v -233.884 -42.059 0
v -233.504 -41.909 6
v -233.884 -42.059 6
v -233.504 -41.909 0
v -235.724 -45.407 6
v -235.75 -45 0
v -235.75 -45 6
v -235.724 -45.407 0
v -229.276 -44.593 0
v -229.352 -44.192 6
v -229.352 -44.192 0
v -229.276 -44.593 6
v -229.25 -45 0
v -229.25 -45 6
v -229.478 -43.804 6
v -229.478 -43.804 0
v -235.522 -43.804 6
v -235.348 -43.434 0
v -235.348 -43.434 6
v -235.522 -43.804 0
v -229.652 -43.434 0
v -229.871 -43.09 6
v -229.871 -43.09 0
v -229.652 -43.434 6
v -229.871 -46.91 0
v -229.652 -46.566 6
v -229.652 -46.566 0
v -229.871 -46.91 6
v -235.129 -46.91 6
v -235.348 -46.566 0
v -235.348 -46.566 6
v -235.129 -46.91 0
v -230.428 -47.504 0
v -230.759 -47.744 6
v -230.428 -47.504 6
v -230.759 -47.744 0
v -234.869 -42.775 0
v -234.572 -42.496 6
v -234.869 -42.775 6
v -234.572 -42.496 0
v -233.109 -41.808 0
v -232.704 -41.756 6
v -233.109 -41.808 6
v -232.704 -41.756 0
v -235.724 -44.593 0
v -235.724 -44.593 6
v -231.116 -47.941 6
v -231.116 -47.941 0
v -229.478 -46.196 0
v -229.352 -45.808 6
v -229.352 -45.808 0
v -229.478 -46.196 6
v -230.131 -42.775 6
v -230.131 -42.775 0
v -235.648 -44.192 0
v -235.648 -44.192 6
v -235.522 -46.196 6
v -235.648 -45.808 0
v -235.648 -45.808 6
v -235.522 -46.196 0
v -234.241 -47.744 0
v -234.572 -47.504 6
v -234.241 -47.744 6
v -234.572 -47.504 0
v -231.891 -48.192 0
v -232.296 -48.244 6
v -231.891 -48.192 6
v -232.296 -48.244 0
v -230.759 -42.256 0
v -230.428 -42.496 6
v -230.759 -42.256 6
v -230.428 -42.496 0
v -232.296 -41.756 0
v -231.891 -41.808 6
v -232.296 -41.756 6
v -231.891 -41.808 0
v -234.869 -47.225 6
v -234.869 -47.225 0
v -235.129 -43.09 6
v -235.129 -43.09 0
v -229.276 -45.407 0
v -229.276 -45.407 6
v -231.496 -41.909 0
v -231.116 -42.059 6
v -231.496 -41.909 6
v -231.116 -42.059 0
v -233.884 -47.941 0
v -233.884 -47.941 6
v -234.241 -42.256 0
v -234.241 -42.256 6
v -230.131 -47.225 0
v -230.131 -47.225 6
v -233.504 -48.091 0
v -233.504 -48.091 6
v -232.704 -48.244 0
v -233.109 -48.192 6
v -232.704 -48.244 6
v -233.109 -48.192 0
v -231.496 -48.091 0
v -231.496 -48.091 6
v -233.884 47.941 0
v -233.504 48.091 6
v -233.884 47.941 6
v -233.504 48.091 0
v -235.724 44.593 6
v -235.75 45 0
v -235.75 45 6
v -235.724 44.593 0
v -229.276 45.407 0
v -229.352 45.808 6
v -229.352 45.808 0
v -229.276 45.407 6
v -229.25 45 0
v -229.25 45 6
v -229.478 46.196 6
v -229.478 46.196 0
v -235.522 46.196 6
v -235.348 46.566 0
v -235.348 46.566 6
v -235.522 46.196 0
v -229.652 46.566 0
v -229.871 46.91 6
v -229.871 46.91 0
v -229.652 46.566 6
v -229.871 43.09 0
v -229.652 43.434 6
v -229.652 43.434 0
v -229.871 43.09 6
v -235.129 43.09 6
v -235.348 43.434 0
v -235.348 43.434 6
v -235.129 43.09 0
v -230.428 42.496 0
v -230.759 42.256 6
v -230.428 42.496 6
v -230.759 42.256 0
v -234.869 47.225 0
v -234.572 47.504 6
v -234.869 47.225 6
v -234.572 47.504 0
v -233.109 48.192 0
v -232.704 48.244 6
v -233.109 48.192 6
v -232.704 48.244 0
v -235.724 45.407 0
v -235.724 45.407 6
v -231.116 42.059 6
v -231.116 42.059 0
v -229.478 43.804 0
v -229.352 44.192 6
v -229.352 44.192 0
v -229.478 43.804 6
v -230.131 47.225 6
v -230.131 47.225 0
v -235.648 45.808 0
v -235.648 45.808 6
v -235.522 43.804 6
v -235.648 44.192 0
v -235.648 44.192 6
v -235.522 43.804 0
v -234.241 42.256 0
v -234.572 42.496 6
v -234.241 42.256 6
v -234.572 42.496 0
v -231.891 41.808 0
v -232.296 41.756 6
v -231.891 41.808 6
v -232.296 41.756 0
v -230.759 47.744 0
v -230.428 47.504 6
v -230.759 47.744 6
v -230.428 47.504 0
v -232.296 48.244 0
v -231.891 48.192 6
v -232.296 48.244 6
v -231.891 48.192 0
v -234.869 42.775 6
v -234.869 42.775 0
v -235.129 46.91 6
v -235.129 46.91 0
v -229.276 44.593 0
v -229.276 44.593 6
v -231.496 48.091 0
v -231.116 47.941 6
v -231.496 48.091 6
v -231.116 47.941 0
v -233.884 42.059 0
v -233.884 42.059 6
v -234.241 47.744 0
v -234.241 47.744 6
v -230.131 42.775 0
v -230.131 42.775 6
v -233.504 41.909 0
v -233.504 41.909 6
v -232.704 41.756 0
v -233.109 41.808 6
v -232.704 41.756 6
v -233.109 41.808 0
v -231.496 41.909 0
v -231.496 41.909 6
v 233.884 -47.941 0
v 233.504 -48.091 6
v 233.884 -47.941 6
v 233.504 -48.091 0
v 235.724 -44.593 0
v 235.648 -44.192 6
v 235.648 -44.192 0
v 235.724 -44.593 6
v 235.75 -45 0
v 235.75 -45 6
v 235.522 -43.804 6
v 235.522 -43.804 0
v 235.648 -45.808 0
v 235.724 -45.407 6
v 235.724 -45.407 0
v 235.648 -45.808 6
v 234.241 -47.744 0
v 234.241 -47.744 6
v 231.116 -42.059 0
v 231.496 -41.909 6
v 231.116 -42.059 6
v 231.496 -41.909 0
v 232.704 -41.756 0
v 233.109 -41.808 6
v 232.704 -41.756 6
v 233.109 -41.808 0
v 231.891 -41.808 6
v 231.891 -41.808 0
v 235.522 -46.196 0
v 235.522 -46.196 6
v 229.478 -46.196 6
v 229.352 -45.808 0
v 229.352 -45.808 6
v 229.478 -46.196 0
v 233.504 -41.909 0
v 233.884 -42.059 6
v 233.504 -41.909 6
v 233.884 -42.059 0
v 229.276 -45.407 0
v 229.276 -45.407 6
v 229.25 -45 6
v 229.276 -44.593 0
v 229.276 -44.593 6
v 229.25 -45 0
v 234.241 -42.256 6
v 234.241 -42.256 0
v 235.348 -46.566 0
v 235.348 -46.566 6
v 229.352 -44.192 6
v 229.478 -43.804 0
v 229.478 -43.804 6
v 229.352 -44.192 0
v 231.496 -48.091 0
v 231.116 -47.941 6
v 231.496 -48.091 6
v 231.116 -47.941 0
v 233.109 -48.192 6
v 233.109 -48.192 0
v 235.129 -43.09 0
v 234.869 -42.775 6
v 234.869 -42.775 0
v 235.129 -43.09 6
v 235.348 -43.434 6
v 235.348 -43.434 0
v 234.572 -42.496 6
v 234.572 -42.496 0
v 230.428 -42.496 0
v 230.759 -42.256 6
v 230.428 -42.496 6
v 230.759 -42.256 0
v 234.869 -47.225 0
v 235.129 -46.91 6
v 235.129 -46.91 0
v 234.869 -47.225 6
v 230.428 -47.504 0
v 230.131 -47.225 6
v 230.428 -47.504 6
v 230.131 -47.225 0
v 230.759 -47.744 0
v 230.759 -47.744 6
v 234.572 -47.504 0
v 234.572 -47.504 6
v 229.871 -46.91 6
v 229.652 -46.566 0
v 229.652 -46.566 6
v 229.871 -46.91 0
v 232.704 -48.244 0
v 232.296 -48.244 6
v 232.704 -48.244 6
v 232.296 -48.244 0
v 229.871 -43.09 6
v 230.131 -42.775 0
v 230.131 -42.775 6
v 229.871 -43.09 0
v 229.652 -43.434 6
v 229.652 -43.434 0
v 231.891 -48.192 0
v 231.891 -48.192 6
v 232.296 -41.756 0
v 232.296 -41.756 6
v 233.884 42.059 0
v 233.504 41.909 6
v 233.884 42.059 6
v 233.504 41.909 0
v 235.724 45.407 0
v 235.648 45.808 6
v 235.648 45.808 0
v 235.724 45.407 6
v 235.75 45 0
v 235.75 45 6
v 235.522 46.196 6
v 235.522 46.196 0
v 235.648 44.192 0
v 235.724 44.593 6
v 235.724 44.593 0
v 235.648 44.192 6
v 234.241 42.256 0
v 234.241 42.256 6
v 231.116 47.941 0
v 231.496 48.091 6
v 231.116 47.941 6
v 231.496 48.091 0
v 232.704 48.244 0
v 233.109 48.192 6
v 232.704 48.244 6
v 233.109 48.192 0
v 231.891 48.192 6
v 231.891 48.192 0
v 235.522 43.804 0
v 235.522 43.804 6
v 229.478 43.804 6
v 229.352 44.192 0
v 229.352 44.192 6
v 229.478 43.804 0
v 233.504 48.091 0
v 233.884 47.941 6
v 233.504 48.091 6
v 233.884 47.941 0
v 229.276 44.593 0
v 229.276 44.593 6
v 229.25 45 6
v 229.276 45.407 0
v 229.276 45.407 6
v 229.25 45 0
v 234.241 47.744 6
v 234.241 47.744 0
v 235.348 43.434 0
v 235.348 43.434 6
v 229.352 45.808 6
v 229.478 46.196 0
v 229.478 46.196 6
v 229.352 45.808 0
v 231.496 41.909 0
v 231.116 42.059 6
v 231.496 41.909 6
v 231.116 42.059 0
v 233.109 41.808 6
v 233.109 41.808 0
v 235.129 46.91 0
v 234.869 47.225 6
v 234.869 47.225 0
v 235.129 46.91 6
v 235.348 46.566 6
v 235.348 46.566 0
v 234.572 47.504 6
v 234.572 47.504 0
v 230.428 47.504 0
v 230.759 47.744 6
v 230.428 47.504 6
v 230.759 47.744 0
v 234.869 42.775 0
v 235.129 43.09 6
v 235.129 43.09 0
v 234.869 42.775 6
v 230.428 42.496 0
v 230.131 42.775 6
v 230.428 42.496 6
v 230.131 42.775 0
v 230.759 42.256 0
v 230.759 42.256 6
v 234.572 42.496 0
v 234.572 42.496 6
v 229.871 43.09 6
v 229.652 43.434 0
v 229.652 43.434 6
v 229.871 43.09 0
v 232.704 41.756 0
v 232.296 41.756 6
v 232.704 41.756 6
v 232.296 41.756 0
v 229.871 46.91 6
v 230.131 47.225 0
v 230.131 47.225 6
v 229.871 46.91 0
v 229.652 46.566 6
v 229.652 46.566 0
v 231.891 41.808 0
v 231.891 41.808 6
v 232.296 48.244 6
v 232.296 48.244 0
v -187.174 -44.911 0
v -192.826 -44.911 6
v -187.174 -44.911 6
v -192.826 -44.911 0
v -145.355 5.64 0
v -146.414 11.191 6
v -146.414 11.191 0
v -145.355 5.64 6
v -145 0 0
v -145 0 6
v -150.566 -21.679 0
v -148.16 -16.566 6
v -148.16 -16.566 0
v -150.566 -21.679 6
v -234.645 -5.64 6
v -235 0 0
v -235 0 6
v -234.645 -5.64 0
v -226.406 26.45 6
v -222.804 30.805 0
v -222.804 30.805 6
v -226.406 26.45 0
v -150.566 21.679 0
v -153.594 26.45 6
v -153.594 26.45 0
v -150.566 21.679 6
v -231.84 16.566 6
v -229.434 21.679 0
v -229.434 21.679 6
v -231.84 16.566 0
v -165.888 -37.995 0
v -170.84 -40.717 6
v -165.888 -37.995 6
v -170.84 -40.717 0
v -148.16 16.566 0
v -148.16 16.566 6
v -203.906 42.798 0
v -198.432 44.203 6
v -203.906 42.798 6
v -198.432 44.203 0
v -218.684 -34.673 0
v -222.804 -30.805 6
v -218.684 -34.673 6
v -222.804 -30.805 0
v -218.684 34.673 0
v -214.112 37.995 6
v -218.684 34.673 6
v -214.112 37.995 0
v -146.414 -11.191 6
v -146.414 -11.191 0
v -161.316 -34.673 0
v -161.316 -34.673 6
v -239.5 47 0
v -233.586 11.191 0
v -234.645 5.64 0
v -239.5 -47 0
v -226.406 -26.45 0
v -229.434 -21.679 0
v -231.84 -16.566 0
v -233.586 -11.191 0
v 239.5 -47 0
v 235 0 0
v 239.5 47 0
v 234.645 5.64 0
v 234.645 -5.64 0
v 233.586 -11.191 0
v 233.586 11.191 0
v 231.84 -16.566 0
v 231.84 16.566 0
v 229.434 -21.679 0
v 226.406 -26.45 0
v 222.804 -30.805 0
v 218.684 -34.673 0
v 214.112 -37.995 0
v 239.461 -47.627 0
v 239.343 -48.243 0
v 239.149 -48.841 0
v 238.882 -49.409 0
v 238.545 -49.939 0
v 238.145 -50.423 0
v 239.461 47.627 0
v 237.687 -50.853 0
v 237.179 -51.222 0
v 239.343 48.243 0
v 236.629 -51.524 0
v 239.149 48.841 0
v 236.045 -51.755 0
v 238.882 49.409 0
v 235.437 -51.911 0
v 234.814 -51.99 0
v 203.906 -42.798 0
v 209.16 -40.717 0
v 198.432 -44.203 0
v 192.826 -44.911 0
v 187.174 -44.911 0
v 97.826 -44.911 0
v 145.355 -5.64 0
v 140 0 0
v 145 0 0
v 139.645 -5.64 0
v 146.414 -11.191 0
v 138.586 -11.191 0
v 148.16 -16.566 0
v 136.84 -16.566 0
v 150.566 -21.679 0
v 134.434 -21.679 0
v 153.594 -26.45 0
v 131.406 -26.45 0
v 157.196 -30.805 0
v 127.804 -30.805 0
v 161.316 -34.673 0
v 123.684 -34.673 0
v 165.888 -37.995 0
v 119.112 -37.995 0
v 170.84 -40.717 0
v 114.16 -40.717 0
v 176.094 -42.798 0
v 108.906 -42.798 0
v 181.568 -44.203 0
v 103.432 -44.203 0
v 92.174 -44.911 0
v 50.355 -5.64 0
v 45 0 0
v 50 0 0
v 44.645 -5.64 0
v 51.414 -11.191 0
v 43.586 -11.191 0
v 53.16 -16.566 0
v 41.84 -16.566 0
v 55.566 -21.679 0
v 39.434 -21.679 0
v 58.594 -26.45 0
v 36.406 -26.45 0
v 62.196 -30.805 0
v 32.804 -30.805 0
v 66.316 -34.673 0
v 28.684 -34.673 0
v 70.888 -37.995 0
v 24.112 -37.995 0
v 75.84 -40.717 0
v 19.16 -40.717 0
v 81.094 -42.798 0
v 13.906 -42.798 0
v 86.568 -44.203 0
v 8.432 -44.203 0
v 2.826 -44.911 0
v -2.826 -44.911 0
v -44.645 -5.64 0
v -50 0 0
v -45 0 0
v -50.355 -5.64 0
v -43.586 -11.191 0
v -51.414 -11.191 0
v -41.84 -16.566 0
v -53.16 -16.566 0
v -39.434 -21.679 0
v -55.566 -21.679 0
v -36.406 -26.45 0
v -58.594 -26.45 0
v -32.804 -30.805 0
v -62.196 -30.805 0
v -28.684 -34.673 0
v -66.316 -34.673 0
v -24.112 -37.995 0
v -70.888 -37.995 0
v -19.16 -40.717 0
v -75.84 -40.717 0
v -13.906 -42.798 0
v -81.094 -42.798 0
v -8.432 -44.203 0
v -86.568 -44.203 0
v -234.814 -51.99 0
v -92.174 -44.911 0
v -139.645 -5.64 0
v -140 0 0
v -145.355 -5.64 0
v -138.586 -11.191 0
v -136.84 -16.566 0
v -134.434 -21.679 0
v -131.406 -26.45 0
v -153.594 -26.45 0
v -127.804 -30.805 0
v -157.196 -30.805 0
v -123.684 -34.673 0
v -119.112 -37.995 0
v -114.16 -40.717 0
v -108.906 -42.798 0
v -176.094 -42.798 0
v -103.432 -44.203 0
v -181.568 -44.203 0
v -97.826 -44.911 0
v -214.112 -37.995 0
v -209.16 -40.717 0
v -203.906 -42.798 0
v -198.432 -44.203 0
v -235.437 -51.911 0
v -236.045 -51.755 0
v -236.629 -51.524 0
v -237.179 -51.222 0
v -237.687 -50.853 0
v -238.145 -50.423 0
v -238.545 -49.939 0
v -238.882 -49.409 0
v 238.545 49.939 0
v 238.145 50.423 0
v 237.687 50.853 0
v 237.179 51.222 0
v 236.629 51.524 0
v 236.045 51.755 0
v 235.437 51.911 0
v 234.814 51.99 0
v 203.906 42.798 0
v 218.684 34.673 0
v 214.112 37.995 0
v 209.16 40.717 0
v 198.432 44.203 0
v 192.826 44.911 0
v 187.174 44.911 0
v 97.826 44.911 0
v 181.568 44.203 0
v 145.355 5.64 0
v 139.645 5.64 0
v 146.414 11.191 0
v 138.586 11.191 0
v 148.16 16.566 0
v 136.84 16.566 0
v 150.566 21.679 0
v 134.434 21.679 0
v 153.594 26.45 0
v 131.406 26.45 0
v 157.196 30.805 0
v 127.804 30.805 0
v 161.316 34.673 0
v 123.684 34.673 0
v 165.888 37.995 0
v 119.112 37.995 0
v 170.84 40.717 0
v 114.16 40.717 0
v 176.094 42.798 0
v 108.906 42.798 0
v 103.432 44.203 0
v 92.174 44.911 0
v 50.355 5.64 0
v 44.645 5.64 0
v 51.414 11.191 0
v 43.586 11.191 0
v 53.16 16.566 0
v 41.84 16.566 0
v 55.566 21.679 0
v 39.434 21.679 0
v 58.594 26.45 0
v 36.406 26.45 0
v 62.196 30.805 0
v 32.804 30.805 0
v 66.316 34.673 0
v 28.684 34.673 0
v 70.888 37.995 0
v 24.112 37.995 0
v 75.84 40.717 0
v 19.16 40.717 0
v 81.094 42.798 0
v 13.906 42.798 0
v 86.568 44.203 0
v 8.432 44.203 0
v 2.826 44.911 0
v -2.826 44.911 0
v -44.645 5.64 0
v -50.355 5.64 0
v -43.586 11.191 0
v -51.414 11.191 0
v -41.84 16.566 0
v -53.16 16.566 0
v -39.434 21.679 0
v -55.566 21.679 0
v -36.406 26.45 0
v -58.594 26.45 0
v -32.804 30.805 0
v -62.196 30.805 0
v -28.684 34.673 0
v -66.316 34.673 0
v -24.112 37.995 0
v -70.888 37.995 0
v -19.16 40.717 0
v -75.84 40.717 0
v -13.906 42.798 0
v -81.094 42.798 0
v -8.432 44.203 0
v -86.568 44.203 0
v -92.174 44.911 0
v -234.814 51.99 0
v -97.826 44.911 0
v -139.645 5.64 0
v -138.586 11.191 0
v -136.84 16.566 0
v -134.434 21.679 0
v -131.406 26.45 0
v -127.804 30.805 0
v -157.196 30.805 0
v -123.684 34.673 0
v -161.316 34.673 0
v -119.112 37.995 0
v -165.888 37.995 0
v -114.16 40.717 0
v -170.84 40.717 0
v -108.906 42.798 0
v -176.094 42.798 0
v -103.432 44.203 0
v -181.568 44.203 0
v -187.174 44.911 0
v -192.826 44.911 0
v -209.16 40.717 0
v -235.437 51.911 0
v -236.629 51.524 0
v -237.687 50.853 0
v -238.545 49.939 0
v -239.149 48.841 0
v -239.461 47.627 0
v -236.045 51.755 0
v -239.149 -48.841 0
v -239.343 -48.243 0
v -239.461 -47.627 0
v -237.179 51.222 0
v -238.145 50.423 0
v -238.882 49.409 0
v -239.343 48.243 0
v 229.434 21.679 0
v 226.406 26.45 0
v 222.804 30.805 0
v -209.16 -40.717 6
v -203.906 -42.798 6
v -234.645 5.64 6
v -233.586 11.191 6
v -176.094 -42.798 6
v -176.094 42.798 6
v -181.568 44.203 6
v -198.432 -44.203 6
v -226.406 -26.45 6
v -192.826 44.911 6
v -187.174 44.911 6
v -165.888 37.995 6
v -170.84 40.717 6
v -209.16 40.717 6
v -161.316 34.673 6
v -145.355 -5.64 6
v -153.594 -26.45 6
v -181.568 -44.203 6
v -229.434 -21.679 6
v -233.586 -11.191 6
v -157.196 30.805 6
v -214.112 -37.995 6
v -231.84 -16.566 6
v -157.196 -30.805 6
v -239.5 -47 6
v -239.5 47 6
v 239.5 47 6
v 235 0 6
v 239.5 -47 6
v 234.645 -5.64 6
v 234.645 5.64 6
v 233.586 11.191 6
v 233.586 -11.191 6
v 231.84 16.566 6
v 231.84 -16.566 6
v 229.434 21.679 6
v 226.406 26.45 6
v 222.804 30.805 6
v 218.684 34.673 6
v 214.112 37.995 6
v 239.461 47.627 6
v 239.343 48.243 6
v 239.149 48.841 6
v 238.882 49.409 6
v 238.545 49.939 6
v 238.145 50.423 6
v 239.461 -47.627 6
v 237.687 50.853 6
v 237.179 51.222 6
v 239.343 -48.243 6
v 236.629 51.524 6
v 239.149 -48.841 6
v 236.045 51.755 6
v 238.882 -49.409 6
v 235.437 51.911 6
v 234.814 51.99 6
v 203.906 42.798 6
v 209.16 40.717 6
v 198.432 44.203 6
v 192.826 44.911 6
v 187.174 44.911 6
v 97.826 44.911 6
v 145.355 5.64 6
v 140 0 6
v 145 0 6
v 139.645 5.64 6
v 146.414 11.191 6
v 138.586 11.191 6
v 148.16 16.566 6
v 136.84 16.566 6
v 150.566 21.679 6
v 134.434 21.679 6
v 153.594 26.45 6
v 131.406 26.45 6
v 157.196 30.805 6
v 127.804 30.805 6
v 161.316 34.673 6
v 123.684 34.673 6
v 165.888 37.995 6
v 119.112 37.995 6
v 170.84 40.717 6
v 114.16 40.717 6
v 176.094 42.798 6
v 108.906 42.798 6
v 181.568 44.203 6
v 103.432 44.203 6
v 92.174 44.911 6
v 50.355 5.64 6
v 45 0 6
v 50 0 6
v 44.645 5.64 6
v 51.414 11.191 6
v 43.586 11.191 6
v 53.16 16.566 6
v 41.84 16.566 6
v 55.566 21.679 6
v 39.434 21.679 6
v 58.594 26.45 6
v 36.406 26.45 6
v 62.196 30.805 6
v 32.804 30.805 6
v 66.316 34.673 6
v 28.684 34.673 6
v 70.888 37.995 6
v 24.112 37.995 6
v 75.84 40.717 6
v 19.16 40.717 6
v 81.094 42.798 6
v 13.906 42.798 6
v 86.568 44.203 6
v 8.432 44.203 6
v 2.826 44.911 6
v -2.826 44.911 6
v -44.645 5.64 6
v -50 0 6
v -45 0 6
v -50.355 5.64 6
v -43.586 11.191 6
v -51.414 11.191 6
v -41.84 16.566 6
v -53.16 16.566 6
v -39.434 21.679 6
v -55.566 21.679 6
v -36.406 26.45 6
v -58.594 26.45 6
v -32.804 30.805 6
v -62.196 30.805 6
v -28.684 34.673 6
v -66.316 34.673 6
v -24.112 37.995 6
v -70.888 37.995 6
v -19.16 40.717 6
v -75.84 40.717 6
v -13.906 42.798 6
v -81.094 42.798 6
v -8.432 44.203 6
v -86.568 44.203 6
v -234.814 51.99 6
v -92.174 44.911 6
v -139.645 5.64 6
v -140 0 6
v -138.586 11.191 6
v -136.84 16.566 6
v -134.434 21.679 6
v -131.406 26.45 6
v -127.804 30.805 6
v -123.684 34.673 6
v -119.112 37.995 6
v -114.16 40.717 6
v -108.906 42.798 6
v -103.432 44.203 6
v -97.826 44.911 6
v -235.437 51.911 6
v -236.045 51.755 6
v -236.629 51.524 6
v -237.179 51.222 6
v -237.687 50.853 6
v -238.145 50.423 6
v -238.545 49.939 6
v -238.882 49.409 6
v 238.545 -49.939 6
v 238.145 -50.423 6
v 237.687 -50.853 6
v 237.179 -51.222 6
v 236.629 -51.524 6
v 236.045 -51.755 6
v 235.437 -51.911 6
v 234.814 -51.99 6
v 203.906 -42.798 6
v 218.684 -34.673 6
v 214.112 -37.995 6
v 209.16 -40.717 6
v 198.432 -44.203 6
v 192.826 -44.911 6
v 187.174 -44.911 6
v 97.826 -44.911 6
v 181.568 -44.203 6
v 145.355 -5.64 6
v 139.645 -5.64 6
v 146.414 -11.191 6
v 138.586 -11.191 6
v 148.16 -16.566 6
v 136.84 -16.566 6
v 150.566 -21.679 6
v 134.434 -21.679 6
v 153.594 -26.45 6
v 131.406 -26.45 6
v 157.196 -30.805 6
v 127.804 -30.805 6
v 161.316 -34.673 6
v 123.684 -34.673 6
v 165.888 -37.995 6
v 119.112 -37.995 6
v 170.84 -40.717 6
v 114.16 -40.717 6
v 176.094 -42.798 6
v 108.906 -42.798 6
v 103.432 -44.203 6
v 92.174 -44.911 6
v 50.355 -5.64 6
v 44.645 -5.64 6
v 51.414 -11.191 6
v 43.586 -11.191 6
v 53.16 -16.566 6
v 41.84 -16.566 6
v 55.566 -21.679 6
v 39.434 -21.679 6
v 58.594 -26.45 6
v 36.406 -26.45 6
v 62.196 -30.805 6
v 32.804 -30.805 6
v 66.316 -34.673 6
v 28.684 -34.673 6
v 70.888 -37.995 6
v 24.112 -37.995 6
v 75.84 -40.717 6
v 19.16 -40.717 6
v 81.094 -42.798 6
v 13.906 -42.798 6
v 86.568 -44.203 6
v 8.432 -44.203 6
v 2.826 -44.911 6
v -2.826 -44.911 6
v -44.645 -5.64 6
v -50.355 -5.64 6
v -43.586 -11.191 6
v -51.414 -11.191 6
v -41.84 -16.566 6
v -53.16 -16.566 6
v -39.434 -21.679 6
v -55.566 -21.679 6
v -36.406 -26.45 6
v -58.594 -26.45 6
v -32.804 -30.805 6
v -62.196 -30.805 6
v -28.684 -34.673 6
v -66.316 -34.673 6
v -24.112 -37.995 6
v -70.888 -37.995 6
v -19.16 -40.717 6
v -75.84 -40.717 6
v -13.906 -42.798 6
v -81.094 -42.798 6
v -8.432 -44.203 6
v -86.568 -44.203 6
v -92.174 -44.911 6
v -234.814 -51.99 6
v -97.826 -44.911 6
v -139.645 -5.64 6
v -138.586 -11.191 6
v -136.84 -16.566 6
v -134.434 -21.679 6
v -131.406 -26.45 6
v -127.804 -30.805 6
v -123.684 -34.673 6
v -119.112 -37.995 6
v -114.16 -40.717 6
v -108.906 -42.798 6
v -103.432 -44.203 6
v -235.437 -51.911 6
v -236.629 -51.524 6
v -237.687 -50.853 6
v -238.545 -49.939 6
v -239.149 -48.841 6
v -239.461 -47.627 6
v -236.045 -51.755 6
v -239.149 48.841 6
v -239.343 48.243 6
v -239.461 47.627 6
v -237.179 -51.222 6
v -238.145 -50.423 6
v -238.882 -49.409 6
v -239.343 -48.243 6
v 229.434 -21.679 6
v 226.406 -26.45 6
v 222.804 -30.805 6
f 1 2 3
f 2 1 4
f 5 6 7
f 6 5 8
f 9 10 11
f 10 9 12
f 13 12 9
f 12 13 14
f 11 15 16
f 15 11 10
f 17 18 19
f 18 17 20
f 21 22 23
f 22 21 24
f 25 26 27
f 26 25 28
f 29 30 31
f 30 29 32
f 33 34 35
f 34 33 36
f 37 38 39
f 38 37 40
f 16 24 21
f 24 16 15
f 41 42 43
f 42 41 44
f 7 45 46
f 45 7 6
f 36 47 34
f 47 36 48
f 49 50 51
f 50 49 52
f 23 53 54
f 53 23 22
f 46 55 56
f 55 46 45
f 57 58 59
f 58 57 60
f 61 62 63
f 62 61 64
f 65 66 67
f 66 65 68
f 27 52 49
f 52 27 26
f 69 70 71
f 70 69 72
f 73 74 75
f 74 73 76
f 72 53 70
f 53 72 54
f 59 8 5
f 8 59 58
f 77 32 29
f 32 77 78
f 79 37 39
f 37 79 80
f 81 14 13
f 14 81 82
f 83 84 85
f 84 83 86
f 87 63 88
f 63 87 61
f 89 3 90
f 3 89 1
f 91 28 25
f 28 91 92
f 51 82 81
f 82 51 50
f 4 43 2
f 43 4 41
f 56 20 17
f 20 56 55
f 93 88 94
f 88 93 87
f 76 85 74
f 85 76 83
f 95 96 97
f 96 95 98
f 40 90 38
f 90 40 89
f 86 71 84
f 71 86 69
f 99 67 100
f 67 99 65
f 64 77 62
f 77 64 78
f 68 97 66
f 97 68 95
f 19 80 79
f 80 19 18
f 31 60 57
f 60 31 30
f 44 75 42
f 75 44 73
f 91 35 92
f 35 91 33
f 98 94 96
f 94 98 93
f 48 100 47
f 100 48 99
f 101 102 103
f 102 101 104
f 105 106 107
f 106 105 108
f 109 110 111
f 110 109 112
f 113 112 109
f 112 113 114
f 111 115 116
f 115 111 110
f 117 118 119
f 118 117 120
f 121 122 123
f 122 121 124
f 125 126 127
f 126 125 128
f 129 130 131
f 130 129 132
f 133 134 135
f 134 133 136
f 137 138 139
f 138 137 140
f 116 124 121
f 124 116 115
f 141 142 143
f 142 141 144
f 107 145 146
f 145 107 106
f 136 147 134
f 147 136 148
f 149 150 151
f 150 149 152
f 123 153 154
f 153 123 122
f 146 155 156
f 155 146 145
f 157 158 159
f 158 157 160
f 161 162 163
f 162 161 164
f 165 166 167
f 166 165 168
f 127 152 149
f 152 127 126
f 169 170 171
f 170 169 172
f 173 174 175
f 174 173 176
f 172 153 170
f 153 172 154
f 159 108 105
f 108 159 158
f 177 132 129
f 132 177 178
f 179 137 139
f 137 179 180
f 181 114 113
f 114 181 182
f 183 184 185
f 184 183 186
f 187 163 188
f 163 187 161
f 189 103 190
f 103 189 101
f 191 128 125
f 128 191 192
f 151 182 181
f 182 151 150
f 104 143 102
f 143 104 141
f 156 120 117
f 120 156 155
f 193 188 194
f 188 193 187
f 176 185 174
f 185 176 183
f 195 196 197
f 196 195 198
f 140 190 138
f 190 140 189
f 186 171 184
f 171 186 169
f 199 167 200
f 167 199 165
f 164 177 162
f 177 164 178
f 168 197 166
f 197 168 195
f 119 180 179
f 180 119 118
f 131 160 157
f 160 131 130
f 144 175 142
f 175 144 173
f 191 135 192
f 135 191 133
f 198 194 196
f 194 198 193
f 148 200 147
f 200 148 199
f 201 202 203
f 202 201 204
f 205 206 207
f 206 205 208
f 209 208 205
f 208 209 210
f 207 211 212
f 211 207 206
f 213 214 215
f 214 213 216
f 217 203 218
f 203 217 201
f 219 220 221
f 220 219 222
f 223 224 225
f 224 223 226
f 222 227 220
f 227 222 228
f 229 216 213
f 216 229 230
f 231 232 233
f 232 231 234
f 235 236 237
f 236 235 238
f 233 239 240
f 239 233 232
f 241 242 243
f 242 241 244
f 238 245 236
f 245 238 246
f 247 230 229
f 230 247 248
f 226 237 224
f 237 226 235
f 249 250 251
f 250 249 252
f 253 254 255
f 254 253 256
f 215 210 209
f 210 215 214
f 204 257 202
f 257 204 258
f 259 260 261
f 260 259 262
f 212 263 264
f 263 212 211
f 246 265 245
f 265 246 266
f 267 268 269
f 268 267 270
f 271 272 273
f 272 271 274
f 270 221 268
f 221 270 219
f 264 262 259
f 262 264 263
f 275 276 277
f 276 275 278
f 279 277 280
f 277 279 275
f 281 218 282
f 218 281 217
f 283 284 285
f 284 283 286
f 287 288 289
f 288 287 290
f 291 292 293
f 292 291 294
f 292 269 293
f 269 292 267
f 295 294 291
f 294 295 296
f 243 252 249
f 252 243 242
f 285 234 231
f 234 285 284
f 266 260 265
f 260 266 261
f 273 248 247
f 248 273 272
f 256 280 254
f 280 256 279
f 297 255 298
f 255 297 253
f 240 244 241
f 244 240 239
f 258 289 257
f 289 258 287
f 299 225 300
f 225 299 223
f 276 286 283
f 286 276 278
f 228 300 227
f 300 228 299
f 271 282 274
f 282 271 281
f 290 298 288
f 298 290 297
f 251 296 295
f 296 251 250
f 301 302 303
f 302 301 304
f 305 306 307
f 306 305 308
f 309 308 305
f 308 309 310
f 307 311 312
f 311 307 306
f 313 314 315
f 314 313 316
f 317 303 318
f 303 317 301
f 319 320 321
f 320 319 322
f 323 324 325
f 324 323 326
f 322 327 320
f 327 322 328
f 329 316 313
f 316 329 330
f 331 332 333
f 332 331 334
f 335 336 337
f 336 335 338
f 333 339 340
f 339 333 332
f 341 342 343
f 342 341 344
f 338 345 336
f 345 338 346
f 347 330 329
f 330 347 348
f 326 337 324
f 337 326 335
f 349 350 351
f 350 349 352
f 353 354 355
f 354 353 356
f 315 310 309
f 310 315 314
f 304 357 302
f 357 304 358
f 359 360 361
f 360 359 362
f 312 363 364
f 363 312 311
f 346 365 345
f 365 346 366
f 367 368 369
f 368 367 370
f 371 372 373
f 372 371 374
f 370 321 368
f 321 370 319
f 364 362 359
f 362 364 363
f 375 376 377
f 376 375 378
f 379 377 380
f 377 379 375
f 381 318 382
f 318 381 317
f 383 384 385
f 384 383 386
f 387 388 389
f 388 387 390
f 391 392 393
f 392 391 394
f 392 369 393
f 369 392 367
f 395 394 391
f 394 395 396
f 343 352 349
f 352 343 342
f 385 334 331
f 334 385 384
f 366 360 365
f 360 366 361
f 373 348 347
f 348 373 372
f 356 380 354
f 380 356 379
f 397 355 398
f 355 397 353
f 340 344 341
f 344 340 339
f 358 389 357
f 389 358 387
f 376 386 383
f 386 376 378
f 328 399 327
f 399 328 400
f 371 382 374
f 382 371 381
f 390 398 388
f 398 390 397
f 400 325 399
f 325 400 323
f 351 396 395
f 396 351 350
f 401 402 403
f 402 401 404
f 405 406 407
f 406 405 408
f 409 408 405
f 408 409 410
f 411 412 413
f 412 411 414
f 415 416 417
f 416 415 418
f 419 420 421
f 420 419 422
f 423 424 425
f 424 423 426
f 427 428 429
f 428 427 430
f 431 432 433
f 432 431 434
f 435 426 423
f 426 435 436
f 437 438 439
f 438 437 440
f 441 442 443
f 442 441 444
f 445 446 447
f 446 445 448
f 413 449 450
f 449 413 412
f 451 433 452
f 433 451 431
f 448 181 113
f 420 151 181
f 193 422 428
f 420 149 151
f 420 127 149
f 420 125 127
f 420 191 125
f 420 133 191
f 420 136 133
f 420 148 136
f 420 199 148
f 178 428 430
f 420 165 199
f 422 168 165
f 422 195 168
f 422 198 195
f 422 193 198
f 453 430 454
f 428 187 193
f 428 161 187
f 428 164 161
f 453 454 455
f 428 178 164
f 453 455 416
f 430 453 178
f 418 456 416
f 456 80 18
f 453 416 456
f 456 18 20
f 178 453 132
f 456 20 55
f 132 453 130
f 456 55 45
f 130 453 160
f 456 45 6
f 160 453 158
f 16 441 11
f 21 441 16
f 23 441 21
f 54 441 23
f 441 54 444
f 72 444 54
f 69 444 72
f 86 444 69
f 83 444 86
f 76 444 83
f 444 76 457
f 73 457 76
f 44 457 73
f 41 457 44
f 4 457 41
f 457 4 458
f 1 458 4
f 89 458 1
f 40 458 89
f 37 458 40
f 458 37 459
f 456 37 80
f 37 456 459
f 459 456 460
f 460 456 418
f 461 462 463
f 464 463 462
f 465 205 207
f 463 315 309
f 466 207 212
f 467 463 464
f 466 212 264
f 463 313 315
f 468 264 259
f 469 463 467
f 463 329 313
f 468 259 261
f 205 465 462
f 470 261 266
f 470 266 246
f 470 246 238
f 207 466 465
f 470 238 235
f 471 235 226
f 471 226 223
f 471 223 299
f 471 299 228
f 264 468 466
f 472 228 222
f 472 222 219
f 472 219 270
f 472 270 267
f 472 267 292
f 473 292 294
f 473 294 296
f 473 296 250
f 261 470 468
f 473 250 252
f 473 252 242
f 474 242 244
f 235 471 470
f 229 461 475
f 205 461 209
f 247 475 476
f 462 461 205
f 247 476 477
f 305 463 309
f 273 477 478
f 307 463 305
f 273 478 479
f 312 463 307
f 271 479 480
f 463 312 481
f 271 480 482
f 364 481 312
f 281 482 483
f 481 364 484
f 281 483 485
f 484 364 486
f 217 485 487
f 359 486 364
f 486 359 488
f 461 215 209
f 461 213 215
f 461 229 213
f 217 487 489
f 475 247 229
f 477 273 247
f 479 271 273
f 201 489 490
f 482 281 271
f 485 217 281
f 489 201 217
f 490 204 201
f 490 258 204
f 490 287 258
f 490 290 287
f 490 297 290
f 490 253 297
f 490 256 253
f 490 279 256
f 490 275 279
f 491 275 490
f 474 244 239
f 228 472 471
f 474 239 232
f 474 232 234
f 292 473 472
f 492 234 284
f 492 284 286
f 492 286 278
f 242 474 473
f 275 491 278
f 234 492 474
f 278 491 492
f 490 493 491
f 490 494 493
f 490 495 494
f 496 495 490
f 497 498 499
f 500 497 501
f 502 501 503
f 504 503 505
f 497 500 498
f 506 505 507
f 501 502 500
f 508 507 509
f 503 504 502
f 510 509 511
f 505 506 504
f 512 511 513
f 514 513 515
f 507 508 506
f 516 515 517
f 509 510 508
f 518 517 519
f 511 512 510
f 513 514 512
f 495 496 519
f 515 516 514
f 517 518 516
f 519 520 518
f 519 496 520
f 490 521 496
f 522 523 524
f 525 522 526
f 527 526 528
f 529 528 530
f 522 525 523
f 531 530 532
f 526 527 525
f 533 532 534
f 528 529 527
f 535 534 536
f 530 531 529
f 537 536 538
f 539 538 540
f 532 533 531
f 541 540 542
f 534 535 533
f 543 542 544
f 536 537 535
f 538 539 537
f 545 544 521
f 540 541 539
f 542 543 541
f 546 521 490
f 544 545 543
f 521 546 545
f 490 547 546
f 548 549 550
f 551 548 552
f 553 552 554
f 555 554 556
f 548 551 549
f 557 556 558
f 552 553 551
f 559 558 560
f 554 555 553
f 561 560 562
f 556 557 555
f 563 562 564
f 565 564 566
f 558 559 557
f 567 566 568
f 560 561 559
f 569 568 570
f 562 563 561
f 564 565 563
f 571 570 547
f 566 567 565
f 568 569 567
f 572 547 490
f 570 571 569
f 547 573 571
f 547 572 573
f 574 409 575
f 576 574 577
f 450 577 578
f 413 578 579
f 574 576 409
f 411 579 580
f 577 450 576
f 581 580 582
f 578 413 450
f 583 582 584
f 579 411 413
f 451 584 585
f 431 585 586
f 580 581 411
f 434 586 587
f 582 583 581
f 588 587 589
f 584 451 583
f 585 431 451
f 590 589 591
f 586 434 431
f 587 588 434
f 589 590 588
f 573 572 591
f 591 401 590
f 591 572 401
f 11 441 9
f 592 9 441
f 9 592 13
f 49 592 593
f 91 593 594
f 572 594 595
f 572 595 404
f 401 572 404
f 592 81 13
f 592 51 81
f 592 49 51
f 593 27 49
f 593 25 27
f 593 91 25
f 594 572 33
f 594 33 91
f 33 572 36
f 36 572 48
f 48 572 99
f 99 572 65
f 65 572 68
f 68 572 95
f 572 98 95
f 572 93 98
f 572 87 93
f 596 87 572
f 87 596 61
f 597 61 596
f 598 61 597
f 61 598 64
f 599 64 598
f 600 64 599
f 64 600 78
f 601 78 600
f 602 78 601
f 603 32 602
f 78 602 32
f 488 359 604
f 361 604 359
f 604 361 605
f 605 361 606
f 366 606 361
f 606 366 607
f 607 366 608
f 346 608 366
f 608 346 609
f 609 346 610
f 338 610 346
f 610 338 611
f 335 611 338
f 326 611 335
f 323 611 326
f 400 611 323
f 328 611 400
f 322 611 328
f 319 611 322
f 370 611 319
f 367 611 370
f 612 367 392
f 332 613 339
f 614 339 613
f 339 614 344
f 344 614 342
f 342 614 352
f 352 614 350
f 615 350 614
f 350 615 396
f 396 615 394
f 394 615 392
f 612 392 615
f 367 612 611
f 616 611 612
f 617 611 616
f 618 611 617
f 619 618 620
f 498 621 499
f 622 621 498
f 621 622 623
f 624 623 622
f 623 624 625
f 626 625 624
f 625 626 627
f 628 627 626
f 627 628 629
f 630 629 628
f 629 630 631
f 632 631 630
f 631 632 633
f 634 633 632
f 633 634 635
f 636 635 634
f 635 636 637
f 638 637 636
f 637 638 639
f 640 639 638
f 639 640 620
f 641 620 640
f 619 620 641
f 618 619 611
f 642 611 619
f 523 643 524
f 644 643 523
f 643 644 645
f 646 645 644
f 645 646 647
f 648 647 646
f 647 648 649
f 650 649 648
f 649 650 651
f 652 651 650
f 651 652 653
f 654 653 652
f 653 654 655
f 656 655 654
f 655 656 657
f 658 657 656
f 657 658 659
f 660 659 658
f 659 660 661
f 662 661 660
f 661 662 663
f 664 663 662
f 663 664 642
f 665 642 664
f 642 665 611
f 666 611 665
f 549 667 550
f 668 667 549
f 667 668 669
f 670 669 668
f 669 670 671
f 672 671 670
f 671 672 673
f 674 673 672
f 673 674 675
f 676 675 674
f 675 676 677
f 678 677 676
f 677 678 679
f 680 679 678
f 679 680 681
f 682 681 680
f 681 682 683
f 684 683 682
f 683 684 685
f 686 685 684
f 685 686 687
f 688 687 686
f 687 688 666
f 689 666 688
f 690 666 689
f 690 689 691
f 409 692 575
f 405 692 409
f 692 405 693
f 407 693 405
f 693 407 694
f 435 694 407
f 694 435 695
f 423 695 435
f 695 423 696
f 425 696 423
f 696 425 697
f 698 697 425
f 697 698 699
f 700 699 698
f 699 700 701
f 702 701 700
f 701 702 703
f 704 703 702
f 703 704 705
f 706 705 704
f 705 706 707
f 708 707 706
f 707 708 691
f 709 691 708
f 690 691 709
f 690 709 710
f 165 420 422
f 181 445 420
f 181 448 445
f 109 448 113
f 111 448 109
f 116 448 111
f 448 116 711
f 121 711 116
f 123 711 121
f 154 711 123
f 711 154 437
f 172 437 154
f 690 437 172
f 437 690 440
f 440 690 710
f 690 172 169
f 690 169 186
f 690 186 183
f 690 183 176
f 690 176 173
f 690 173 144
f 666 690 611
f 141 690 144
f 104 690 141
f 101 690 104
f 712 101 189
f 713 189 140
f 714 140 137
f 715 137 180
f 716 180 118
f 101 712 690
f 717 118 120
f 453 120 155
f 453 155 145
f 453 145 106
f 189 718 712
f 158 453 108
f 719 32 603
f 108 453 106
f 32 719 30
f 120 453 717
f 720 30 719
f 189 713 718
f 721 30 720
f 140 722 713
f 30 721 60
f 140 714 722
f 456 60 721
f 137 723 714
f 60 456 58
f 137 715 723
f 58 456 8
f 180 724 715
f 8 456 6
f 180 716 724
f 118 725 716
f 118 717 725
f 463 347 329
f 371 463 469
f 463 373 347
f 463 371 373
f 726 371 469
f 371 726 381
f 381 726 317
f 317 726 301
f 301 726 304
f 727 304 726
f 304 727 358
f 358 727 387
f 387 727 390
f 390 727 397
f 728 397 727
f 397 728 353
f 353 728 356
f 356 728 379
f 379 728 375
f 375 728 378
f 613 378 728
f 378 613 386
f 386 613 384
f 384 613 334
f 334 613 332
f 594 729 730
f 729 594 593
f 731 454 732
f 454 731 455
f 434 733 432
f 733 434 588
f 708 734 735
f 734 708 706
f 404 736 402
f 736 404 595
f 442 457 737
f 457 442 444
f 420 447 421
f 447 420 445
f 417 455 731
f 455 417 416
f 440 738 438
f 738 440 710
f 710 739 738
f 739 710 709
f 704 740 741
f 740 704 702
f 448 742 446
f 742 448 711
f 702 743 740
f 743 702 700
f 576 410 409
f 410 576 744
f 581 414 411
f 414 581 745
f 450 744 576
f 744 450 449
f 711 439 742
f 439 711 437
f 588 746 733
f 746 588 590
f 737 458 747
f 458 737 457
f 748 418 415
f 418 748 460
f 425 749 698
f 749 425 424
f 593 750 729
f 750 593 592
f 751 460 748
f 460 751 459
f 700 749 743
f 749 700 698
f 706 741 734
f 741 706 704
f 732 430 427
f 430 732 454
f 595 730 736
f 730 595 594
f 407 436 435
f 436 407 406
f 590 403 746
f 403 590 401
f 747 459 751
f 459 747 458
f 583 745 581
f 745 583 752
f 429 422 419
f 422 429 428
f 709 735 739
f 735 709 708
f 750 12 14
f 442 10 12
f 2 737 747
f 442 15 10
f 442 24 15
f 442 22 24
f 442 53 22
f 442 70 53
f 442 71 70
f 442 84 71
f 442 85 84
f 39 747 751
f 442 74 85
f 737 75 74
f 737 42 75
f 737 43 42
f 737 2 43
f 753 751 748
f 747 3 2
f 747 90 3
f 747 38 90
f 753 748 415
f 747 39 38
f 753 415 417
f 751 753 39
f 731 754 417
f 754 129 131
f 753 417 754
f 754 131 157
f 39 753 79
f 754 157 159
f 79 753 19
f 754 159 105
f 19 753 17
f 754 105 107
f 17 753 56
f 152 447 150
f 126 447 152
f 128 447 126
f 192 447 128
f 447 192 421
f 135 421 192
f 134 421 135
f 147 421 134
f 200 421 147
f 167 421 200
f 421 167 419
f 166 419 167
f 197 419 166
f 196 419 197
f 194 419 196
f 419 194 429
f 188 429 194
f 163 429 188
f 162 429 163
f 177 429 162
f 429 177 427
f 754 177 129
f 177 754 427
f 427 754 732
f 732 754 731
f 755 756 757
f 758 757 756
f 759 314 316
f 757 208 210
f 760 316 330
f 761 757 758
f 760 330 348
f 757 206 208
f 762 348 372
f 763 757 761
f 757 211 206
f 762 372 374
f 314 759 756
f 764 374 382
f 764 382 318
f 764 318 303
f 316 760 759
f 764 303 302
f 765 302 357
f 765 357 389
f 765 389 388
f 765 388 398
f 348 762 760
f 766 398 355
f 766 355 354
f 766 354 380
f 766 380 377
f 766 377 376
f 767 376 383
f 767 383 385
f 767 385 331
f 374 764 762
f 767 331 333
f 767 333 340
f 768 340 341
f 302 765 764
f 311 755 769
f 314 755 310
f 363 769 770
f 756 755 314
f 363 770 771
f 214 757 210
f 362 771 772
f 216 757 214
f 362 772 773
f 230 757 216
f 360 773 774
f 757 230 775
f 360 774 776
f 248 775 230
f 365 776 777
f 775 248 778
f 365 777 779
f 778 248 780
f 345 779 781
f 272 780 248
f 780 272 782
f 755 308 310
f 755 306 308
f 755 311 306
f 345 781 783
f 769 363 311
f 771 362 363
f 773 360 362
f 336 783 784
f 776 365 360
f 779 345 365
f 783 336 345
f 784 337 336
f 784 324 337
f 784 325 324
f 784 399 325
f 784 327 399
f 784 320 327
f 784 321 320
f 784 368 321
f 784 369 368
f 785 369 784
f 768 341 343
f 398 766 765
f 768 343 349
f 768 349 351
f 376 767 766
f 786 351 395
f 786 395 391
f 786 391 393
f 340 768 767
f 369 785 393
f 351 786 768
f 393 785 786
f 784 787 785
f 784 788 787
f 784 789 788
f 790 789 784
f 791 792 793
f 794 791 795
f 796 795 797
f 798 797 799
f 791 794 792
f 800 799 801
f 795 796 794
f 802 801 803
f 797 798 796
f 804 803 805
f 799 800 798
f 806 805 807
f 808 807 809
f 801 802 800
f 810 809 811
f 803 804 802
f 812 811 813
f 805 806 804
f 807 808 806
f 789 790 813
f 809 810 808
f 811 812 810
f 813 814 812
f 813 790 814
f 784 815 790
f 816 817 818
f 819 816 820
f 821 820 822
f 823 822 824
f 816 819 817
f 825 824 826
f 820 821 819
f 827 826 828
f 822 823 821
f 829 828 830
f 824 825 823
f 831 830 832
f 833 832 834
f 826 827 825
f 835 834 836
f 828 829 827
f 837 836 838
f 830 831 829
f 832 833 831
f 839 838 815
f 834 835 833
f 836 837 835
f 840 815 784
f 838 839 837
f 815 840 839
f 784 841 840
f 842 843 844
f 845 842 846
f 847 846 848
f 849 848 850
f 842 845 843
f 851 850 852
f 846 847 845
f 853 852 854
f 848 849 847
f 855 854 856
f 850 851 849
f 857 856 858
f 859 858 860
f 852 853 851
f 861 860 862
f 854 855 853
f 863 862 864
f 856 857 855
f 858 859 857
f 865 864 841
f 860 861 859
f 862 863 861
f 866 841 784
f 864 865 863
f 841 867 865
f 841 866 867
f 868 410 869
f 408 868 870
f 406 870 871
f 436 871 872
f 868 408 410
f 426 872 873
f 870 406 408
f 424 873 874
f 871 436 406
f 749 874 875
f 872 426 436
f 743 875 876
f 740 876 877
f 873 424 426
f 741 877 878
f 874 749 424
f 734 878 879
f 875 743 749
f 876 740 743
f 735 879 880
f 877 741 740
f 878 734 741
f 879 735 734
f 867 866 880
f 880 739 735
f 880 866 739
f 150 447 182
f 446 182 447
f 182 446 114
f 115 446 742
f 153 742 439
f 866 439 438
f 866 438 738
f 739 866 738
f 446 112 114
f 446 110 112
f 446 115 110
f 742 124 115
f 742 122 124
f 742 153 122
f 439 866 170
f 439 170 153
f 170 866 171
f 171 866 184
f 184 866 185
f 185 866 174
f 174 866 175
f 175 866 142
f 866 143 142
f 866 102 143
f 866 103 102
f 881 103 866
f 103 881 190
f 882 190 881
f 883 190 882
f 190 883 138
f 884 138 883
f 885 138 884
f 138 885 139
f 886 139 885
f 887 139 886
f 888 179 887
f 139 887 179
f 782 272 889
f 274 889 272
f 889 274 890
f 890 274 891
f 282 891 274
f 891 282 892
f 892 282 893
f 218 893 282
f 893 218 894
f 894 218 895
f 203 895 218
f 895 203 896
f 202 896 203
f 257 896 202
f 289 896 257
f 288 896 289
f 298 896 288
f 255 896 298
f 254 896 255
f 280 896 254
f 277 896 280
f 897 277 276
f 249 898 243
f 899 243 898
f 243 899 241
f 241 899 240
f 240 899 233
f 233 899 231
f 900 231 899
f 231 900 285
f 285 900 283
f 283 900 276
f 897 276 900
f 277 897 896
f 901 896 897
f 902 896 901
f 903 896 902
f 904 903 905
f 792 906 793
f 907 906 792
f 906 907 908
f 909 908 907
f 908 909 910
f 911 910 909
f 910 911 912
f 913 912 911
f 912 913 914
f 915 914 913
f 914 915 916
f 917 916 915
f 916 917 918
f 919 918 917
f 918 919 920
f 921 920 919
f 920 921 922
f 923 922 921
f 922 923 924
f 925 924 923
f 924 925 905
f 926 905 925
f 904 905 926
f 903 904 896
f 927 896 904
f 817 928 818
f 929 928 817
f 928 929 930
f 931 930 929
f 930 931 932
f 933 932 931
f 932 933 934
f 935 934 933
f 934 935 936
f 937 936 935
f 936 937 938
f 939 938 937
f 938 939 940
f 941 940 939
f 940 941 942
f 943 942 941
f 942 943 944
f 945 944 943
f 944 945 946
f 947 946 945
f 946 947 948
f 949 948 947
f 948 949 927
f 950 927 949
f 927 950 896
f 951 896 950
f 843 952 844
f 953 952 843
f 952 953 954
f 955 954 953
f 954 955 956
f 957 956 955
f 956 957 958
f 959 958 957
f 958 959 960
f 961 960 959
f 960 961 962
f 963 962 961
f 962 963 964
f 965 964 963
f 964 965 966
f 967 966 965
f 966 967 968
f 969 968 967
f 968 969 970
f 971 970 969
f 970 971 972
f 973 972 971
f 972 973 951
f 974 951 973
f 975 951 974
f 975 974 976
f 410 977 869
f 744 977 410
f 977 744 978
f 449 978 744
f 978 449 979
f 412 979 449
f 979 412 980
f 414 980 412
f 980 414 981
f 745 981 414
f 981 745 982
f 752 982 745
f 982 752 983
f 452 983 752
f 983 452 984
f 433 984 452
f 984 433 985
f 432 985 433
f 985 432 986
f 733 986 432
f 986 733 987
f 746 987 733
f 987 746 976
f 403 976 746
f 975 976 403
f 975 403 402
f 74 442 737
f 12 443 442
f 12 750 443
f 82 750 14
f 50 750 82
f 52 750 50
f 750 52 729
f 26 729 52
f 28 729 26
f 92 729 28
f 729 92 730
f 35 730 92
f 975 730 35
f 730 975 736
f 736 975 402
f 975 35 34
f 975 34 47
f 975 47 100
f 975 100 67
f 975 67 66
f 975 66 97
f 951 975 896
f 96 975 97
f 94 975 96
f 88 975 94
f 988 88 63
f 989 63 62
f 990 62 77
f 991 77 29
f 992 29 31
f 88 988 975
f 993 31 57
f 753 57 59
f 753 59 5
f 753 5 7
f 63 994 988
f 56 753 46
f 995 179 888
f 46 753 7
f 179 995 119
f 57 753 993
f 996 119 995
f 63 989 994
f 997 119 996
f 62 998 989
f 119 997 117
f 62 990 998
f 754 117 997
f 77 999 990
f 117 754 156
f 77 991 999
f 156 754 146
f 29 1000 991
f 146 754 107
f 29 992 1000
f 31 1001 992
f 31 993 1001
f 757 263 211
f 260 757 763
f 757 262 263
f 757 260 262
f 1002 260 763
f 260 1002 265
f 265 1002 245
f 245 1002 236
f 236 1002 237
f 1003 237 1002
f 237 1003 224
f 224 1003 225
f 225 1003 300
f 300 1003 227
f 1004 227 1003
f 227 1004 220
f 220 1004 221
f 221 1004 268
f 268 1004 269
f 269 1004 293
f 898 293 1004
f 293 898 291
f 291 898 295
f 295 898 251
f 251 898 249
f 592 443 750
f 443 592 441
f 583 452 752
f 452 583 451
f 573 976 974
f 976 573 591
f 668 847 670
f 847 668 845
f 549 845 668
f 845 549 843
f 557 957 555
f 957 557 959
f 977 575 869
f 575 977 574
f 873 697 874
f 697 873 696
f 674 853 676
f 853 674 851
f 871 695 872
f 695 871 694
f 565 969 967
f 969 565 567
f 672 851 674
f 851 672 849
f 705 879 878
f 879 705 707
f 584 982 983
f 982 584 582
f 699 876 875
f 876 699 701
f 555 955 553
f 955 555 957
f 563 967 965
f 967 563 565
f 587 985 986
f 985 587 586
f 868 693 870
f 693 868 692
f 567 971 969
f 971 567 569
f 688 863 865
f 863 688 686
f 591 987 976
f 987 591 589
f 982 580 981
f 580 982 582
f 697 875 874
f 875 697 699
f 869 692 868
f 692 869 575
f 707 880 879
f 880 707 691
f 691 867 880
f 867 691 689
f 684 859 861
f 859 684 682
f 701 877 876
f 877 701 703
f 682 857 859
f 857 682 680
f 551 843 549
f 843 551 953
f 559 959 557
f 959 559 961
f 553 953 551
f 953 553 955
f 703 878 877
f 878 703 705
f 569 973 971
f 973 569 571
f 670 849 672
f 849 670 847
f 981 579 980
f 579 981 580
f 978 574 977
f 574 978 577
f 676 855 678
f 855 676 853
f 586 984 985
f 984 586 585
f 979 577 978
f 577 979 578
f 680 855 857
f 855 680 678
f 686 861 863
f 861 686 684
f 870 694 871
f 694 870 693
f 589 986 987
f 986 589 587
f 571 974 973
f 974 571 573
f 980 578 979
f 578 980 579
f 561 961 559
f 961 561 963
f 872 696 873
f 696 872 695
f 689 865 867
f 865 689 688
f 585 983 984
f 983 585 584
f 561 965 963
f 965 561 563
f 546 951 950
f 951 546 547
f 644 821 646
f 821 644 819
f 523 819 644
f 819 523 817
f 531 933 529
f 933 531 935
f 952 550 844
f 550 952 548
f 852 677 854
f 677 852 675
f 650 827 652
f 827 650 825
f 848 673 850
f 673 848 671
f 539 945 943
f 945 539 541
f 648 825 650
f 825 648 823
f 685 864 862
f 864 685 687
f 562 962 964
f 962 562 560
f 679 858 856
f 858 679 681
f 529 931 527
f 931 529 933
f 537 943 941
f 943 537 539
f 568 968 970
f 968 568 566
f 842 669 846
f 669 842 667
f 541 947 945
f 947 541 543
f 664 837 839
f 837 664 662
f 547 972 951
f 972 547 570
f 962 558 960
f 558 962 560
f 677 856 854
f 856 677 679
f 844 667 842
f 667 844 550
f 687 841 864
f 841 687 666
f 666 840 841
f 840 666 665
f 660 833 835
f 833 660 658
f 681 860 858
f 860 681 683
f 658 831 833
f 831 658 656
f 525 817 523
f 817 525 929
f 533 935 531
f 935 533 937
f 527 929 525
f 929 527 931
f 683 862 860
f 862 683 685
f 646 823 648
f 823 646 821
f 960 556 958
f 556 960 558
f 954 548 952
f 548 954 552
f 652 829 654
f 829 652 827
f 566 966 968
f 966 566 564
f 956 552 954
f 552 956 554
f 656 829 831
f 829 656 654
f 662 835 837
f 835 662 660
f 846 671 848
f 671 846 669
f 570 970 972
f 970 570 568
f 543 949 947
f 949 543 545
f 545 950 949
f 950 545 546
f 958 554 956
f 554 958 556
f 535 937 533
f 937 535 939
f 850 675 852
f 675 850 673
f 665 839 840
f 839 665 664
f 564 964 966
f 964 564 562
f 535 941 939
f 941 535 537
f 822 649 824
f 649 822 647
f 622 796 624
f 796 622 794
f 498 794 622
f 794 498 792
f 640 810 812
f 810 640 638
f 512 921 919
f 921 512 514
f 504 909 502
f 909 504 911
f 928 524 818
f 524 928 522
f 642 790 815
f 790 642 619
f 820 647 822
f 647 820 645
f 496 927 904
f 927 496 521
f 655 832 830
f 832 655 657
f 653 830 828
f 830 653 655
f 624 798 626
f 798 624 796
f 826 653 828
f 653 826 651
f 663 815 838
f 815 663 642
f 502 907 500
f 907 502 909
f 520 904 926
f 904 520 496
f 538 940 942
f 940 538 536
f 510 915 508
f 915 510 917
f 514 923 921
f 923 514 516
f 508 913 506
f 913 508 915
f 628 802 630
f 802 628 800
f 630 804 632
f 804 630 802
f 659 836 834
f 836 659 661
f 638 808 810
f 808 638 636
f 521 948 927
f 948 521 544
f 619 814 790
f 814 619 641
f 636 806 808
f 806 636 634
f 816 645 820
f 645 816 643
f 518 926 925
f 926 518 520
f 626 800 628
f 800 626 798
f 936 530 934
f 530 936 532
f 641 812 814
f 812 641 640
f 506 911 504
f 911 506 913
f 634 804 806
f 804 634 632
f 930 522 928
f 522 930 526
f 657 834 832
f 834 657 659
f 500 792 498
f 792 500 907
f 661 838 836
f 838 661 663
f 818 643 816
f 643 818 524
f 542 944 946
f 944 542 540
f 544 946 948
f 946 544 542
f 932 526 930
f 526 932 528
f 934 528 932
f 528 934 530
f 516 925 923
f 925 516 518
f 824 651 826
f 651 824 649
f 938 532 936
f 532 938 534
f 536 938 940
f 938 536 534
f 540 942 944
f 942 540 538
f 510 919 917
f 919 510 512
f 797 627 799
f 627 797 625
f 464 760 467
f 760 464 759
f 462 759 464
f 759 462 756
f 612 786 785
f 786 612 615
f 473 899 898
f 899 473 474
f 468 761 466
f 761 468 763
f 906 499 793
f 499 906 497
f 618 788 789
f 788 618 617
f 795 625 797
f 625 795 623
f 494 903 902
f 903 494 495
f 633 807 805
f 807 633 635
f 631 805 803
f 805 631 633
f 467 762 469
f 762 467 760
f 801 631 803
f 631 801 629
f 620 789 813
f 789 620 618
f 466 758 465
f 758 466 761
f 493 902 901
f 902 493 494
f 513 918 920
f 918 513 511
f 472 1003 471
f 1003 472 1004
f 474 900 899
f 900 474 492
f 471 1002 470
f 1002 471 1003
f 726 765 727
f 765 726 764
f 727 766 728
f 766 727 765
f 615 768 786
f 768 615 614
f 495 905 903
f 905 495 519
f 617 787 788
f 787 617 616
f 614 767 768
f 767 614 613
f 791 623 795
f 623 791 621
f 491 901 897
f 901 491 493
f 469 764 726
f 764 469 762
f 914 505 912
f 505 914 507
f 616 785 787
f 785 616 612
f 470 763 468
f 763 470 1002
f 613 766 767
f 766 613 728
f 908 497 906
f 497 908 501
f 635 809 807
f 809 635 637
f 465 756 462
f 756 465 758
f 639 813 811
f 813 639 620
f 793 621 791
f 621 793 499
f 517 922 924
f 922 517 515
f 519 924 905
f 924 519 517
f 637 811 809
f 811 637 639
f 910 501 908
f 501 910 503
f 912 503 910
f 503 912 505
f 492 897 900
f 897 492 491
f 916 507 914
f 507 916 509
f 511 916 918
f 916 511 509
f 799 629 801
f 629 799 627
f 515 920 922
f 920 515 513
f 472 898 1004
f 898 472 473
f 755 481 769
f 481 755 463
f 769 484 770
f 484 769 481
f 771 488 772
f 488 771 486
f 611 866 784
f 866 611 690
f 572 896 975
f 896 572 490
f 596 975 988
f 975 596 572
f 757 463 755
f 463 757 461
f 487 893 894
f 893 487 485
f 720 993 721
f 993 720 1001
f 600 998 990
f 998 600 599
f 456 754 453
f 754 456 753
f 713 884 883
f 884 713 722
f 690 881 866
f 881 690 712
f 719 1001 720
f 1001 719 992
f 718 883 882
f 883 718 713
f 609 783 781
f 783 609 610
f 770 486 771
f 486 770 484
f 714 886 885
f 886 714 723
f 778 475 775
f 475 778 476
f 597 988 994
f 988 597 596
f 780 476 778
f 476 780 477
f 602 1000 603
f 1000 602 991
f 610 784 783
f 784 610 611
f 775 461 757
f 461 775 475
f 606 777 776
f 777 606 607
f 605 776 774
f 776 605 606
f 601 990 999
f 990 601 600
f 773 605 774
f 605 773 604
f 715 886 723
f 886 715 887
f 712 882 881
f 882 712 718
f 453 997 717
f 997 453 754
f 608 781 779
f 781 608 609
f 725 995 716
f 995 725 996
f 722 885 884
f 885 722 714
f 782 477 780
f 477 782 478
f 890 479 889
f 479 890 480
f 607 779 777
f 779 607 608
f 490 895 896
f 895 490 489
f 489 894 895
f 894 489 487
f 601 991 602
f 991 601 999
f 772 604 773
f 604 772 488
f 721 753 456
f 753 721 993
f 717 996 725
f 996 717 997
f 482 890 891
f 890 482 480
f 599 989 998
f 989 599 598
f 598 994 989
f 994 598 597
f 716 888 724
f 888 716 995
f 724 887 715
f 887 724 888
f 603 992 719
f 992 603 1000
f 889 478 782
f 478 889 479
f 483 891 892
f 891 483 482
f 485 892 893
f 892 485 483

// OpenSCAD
$fn = 50;


difference() {
	union() {
		hull() {
			translate(v = [-234.5000000000, 47.0000000000, 0]) {
				cylinder(h = 6, r = 5);
			}
			translate(v = [234.5000000000, 47.0000000000, 0]) {
				cylinder(h = 6, r = 5);
			}
			translate(v = [-234.5000000000, -47.0000000000, 0]) {
				cylinder(h = 6, r = 5);
			}
			translate(v = [234.5000000000, -47.0000000000, 0]) {
				cylinder(h = 6, r = 5);
			}
		}
	}
	union() {
		#translate(v = [-232.5000000000, -45.0000000000, -100.0000000000]) {
			cylinder(h = 200, r = 3.2500000000);
		}
		#translate(v = [-232.5000000000, 45.0000000000, -100.0000000000]) {
			cylinder(h = 200, r = 3.2500000000);
		}
		#translate(v = [232.5000000000, -45.0000000000, -100.0000000000]) {
			cylinder(h = 200, r = 3.2500000000);
		}
		#translate(v = [232.5000000000, 45.0000000000, -100.0000000000]) {
			cylinder(h = 200, r = 3.2500000000);
		}
		#translate(v = [-190.0000000000, 0, 0]) {
			cylinder(h = 6, r = 45.0000000000);
		}
		#translate(v = [-95.0000000000, 0, 0]) {
			cylinder(h = 6, r = 45.0000000000);
		}
		#cylinder(h = 6, r = 45.0000000000);
		#translate(v = [95.0000000000, 0, 0]) {
			cylinder(h = 6, r = 45.0000000000);
		}
		#translate(v = [190.0000000000, 0, 0]) {
			cylinder(h = 6, r = 45.0000000000);
		}
	}
}
